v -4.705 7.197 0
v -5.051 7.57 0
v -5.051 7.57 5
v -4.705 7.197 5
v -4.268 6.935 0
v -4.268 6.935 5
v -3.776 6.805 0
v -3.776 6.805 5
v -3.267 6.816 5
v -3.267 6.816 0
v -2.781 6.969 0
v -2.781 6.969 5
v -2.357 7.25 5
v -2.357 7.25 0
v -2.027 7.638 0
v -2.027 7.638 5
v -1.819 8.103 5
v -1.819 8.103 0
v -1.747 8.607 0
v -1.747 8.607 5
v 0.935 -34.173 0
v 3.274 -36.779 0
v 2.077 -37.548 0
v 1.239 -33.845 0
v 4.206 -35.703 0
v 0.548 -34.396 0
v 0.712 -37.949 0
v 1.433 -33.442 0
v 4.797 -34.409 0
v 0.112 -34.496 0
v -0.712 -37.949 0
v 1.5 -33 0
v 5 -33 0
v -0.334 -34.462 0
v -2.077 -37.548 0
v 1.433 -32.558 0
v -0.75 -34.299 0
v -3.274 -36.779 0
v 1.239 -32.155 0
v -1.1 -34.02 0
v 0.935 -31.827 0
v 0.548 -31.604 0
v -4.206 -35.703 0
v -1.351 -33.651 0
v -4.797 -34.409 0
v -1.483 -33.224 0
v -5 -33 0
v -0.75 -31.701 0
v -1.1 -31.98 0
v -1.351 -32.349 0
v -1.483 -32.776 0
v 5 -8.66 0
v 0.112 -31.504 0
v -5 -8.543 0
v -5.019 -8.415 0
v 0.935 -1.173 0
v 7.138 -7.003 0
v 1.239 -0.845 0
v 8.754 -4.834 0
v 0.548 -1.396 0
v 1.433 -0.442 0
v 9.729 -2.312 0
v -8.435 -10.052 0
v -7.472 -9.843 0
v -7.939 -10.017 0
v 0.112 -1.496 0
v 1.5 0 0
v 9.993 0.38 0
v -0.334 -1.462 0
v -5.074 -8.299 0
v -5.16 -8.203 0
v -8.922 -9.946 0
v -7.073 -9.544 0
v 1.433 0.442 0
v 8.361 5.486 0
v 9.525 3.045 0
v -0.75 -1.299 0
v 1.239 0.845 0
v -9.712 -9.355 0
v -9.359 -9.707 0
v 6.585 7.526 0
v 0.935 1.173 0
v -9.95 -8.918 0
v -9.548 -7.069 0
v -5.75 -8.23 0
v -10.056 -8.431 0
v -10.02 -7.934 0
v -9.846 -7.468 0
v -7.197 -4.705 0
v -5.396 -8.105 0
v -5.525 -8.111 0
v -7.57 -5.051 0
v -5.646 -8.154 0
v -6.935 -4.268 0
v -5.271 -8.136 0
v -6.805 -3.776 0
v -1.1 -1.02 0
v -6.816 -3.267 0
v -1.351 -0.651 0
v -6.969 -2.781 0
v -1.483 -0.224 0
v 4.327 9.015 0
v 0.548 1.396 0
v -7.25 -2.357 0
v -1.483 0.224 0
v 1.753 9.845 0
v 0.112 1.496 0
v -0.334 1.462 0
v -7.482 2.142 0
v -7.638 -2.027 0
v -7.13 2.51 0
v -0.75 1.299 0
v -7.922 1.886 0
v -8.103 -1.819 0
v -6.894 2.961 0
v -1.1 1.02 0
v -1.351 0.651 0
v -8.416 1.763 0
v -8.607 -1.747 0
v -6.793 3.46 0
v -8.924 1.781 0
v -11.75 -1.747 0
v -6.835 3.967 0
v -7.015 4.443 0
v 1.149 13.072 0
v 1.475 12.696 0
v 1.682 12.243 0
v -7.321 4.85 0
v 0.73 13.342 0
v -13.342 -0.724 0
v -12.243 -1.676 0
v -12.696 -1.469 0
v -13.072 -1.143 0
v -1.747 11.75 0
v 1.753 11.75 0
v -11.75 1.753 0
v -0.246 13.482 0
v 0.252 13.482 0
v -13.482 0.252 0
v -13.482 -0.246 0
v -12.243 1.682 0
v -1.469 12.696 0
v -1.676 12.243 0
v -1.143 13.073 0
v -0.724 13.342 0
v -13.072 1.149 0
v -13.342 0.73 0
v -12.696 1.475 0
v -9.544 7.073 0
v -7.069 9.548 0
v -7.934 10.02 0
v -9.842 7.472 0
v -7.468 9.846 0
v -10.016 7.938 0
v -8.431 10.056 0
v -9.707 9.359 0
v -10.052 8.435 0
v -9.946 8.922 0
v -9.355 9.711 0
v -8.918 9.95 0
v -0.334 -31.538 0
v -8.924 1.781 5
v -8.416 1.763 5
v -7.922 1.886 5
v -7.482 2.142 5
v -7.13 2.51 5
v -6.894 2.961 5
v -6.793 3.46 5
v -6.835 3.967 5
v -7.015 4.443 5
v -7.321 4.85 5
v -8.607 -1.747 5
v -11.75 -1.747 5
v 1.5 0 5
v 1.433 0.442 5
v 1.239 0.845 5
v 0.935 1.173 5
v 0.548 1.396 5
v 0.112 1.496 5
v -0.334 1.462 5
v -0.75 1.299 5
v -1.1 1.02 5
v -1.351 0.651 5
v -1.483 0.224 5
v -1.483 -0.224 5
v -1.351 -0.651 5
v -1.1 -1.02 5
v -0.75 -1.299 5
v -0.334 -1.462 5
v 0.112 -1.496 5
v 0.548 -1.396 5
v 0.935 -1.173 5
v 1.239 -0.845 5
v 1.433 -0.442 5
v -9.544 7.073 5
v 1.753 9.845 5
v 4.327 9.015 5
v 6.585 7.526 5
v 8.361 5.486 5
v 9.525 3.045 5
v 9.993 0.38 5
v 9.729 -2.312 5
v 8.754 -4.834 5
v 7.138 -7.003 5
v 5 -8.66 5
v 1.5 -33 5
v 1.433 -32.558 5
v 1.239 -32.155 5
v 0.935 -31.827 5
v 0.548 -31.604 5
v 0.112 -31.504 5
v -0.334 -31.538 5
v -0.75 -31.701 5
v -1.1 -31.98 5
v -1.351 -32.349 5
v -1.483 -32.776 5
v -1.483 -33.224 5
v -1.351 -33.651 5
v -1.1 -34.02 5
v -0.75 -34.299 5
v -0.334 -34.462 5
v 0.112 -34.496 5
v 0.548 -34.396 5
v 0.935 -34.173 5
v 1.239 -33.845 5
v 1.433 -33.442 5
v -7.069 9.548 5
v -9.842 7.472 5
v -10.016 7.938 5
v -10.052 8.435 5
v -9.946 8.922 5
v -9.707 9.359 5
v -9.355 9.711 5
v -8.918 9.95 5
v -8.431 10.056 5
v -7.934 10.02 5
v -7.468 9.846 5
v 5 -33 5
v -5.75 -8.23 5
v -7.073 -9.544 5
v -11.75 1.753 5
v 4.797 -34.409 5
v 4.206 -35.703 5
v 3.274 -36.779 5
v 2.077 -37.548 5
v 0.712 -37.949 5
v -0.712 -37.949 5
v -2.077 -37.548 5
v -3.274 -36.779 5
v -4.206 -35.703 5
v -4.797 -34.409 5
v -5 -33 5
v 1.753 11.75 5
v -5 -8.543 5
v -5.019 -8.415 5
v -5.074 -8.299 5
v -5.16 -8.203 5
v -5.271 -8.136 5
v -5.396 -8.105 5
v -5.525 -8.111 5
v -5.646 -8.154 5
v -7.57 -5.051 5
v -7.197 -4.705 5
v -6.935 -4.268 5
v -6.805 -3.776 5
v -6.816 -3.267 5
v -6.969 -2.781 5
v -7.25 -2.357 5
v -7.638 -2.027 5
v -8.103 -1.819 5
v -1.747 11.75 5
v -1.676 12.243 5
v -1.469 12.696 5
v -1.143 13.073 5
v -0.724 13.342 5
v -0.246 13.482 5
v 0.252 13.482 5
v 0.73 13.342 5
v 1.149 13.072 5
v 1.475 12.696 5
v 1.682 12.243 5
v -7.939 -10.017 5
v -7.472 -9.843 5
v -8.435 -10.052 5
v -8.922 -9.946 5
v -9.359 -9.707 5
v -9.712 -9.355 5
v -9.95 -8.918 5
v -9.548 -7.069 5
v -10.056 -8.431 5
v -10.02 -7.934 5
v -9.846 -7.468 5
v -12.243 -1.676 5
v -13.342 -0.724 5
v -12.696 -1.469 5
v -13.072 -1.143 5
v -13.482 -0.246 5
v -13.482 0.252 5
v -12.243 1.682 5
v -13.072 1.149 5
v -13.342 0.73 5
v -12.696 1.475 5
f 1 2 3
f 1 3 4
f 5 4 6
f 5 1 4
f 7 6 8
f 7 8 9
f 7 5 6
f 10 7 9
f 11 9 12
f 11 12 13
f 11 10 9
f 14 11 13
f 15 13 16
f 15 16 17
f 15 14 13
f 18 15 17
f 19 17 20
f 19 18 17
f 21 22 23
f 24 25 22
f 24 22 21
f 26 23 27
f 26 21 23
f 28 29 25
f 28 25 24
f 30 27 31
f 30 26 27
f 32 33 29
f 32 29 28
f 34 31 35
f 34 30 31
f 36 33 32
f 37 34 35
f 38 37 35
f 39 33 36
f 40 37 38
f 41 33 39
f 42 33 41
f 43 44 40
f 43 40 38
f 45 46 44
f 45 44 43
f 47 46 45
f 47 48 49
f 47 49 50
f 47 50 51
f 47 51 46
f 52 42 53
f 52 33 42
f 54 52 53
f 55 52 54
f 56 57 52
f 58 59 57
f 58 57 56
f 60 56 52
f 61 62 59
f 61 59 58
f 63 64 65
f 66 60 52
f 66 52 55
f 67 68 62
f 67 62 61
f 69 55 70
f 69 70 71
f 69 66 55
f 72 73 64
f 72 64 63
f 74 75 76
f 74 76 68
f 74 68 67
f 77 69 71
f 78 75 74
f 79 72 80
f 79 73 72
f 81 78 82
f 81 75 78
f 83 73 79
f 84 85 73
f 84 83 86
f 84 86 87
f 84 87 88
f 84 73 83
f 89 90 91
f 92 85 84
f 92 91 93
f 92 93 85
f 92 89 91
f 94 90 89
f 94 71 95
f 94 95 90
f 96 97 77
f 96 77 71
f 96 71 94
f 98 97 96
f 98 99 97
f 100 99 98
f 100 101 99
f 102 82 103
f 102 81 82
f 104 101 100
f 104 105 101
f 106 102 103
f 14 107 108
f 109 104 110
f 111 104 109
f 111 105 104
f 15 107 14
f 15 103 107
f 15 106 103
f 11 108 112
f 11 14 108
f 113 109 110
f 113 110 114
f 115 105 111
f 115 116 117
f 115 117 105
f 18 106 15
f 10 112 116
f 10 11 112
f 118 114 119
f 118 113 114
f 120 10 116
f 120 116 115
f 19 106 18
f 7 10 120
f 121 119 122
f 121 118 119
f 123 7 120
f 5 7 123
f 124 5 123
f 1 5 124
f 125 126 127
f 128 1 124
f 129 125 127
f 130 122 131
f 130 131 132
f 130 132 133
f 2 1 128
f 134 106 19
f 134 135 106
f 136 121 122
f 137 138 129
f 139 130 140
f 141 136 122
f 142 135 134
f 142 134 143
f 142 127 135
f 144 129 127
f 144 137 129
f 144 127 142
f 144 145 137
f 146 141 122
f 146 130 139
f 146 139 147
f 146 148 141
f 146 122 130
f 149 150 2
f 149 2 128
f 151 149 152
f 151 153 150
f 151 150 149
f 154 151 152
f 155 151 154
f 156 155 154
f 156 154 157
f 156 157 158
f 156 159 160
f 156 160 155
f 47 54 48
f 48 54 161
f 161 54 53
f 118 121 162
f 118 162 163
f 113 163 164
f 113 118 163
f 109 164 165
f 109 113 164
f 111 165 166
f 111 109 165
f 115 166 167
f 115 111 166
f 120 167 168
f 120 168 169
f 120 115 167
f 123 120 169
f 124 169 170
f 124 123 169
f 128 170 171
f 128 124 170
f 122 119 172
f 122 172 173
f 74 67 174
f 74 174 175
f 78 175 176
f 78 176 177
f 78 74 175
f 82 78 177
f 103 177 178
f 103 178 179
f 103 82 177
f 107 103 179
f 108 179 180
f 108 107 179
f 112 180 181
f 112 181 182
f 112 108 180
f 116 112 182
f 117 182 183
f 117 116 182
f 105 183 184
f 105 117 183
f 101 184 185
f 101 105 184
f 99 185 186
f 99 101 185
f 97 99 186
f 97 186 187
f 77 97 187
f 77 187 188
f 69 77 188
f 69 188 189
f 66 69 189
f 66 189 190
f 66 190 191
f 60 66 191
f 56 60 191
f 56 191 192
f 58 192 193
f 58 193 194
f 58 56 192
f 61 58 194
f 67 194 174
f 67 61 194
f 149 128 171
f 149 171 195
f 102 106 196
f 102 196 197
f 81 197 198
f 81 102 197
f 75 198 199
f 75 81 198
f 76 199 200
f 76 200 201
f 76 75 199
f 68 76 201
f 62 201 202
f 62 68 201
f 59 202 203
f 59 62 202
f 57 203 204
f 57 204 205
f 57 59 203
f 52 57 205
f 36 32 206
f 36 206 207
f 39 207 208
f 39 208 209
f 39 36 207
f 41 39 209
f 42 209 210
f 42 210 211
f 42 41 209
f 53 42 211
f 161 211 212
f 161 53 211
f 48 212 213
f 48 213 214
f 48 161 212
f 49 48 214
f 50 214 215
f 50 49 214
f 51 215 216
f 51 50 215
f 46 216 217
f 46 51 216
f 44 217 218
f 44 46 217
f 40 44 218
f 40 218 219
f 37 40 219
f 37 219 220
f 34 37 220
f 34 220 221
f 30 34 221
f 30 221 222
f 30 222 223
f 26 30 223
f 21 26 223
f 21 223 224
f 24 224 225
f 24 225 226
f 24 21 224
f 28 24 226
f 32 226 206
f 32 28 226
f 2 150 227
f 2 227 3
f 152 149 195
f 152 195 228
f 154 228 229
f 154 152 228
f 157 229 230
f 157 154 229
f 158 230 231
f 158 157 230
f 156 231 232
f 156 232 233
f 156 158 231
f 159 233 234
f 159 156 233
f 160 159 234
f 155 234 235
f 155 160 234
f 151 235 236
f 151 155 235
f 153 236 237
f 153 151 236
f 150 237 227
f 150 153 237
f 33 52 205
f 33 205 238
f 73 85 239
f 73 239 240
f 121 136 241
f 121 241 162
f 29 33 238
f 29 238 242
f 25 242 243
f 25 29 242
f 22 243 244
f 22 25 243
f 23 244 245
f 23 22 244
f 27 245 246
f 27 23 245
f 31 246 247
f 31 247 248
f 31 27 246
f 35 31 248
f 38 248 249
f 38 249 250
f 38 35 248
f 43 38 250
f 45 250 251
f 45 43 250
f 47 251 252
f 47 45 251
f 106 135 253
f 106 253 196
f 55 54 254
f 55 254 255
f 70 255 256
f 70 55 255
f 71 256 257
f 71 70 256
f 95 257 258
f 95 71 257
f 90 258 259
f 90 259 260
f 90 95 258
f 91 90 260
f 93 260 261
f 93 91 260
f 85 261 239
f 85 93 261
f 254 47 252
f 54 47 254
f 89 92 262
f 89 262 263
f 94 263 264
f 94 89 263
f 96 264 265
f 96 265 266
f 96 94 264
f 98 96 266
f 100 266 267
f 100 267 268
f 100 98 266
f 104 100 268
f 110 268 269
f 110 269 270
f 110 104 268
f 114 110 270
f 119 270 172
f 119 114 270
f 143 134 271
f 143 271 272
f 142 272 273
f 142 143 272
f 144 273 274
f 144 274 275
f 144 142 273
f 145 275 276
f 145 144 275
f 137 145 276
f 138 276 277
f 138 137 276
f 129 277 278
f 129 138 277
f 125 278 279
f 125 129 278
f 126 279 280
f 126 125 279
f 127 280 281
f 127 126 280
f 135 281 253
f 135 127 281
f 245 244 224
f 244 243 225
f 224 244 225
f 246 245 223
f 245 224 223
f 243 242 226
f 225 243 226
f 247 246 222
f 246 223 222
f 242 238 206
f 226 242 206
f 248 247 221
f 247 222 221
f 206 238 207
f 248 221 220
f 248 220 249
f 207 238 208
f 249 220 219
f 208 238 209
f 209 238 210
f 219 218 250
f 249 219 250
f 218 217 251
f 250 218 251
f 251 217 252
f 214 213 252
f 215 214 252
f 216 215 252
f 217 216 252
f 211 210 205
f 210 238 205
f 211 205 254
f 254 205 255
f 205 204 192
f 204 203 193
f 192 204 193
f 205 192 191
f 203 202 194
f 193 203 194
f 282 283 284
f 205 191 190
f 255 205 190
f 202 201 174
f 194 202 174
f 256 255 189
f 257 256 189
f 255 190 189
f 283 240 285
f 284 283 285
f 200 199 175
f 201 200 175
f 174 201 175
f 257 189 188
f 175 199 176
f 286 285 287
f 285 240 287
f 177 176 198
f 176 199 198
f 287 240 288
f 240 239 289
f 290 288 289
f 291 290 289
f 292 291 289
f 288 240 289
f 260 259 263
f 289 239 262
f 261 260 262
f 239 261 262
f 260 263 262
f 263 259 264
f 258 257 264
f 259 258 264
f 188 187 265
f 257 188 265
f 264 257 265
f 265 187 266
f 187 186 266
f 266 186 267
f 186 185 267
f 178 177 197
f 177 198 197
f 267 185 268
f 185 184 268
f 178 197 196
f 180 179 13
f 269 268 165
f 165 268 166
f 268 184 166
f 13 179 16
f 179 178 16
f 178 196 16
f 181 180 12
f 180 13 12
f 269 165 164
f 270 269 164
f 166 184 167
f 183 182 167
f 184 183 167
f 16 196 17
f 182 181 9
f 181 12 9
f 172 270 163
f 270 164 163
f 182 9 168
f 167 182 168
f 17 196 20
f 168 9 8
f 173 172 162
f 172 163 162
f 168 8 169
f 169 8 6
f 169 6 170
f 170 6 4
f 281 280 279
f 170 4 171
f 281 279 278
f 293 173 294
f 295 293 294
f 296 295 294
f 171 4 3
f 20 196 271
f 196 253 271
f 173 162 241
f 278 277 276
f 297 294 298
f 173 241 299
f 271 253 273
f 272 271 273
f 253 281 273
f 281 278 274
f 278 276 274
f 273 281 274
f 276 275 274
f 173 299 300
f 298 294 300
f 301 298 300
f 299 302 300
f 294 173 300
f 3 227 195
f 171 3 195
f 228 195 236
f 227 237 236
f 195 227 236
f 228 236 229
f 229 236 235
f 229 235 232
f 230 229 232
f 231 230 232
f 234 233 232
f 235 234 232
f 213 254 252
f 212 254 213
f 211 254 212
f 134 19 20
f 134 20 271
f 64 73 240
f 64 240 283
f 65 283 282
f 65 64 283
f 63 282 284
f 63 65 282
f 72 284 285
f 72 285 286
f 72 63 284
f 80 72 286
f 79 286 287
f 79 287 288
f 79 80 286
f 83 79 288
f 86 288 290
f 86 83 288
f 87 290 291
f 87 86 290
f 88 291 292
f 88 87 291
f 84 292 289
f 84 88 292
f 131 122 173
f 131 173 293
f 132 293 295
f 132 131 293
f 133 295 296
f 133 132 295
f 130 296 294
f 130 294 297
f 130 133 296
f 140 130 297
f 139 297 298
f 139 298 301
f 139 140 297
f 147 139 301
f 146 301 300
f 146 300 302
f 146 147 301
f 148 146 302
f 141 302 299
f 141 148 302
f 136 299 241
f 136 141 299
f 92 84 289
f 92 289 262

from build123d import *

# Parameters (mm, degrees)
SKETCH2_R           = 1.5
BOSS_EXTRUDE1_DEPTH = 5


with BuildPart() as part:
    # Sketch2 → Boss-Extrude1 (new body)
    with BuildSketch(Plane.XY):
        with BuildLine():
            Line((5, -8.660254038), (5, -33))
            ThreePointArc((5, -33), (0, -38), (-5, -33))
            Line((-5, -33), (-5, -8.542766751))
            ThreePointArc((-5, -8.542766751), (-5.270994803, -8.136429895), (-5.750270597, -8.230464661))
            Line((-5.750270597, -8.230464661), (-7.072992385, -9.544016527))
            ThreePointArc((-7.072992385, -9.544016527), (-9.548009447, -9.543873182), (-9.547579415, -7.068856154))
            Line((-9.547579415, -7.068856154), (-7.570062095, -5.051082723))
            ThreePointArc((-7.570062095, -5.051082723), (-6.875312951, -3.018601992), (-8.606609983, -1.747277927))
            Line((-8.606609983, -1.747277927), (-11.749999685, -1.747277927))
            ThreePointArc((-11.749999685, -1.747277927), (-13.499796954, 0.002924757), (-11.74959427, 1.752722026))
            Line((-11.74959427, 1.752722026), (-8.924497087, 1.781187396))
            ThreePointArc((-8.924497087, 1.781187396), (-6.996054349, 2.727106472), (-7.321304353, 4.850280211))
            Line((-7.321304353, 4.850280211), (-9.544016527, 7.072992385))
            ThreePointArc((-9.544016527, 7.072992385), (-9.543729855, 9.547866086), (-7.068856154, 9.547579415))
            Line((-7.068856154, 9.547579415), (-5.051082723, 7.570062095))
            ThreePointArc((-5.051082723, 7.570062095), (-3.018601992, 6.875312951), (-1.747277927, 8.606609983))
            Line((-1.747277927, 8.606609983), (-1.747277927, 11.749999685))
            ThreePointArc((-1.747277927, 11.749999685), (0.002924781, 13.499999673), (1.752722026, 11.74959427))
            Line((1.752722026, 11.74959427), (1.752722026, 9.845200125))
            ThreePointArc((1.752722026, 9.845200125), (9.849506187, 1.728359878), (5, -8.660254038))
        make_face()
        with Locations((0, -33)):
            Circle(SKETCH2_R, mode=Mode.SUBTRACT)
        Circle(SKETCH2_R, mode=Mode.SUBTRACT)
    extrude(amount=BOSS_EXTRUDE1_DEPTH)


solid = part.part
